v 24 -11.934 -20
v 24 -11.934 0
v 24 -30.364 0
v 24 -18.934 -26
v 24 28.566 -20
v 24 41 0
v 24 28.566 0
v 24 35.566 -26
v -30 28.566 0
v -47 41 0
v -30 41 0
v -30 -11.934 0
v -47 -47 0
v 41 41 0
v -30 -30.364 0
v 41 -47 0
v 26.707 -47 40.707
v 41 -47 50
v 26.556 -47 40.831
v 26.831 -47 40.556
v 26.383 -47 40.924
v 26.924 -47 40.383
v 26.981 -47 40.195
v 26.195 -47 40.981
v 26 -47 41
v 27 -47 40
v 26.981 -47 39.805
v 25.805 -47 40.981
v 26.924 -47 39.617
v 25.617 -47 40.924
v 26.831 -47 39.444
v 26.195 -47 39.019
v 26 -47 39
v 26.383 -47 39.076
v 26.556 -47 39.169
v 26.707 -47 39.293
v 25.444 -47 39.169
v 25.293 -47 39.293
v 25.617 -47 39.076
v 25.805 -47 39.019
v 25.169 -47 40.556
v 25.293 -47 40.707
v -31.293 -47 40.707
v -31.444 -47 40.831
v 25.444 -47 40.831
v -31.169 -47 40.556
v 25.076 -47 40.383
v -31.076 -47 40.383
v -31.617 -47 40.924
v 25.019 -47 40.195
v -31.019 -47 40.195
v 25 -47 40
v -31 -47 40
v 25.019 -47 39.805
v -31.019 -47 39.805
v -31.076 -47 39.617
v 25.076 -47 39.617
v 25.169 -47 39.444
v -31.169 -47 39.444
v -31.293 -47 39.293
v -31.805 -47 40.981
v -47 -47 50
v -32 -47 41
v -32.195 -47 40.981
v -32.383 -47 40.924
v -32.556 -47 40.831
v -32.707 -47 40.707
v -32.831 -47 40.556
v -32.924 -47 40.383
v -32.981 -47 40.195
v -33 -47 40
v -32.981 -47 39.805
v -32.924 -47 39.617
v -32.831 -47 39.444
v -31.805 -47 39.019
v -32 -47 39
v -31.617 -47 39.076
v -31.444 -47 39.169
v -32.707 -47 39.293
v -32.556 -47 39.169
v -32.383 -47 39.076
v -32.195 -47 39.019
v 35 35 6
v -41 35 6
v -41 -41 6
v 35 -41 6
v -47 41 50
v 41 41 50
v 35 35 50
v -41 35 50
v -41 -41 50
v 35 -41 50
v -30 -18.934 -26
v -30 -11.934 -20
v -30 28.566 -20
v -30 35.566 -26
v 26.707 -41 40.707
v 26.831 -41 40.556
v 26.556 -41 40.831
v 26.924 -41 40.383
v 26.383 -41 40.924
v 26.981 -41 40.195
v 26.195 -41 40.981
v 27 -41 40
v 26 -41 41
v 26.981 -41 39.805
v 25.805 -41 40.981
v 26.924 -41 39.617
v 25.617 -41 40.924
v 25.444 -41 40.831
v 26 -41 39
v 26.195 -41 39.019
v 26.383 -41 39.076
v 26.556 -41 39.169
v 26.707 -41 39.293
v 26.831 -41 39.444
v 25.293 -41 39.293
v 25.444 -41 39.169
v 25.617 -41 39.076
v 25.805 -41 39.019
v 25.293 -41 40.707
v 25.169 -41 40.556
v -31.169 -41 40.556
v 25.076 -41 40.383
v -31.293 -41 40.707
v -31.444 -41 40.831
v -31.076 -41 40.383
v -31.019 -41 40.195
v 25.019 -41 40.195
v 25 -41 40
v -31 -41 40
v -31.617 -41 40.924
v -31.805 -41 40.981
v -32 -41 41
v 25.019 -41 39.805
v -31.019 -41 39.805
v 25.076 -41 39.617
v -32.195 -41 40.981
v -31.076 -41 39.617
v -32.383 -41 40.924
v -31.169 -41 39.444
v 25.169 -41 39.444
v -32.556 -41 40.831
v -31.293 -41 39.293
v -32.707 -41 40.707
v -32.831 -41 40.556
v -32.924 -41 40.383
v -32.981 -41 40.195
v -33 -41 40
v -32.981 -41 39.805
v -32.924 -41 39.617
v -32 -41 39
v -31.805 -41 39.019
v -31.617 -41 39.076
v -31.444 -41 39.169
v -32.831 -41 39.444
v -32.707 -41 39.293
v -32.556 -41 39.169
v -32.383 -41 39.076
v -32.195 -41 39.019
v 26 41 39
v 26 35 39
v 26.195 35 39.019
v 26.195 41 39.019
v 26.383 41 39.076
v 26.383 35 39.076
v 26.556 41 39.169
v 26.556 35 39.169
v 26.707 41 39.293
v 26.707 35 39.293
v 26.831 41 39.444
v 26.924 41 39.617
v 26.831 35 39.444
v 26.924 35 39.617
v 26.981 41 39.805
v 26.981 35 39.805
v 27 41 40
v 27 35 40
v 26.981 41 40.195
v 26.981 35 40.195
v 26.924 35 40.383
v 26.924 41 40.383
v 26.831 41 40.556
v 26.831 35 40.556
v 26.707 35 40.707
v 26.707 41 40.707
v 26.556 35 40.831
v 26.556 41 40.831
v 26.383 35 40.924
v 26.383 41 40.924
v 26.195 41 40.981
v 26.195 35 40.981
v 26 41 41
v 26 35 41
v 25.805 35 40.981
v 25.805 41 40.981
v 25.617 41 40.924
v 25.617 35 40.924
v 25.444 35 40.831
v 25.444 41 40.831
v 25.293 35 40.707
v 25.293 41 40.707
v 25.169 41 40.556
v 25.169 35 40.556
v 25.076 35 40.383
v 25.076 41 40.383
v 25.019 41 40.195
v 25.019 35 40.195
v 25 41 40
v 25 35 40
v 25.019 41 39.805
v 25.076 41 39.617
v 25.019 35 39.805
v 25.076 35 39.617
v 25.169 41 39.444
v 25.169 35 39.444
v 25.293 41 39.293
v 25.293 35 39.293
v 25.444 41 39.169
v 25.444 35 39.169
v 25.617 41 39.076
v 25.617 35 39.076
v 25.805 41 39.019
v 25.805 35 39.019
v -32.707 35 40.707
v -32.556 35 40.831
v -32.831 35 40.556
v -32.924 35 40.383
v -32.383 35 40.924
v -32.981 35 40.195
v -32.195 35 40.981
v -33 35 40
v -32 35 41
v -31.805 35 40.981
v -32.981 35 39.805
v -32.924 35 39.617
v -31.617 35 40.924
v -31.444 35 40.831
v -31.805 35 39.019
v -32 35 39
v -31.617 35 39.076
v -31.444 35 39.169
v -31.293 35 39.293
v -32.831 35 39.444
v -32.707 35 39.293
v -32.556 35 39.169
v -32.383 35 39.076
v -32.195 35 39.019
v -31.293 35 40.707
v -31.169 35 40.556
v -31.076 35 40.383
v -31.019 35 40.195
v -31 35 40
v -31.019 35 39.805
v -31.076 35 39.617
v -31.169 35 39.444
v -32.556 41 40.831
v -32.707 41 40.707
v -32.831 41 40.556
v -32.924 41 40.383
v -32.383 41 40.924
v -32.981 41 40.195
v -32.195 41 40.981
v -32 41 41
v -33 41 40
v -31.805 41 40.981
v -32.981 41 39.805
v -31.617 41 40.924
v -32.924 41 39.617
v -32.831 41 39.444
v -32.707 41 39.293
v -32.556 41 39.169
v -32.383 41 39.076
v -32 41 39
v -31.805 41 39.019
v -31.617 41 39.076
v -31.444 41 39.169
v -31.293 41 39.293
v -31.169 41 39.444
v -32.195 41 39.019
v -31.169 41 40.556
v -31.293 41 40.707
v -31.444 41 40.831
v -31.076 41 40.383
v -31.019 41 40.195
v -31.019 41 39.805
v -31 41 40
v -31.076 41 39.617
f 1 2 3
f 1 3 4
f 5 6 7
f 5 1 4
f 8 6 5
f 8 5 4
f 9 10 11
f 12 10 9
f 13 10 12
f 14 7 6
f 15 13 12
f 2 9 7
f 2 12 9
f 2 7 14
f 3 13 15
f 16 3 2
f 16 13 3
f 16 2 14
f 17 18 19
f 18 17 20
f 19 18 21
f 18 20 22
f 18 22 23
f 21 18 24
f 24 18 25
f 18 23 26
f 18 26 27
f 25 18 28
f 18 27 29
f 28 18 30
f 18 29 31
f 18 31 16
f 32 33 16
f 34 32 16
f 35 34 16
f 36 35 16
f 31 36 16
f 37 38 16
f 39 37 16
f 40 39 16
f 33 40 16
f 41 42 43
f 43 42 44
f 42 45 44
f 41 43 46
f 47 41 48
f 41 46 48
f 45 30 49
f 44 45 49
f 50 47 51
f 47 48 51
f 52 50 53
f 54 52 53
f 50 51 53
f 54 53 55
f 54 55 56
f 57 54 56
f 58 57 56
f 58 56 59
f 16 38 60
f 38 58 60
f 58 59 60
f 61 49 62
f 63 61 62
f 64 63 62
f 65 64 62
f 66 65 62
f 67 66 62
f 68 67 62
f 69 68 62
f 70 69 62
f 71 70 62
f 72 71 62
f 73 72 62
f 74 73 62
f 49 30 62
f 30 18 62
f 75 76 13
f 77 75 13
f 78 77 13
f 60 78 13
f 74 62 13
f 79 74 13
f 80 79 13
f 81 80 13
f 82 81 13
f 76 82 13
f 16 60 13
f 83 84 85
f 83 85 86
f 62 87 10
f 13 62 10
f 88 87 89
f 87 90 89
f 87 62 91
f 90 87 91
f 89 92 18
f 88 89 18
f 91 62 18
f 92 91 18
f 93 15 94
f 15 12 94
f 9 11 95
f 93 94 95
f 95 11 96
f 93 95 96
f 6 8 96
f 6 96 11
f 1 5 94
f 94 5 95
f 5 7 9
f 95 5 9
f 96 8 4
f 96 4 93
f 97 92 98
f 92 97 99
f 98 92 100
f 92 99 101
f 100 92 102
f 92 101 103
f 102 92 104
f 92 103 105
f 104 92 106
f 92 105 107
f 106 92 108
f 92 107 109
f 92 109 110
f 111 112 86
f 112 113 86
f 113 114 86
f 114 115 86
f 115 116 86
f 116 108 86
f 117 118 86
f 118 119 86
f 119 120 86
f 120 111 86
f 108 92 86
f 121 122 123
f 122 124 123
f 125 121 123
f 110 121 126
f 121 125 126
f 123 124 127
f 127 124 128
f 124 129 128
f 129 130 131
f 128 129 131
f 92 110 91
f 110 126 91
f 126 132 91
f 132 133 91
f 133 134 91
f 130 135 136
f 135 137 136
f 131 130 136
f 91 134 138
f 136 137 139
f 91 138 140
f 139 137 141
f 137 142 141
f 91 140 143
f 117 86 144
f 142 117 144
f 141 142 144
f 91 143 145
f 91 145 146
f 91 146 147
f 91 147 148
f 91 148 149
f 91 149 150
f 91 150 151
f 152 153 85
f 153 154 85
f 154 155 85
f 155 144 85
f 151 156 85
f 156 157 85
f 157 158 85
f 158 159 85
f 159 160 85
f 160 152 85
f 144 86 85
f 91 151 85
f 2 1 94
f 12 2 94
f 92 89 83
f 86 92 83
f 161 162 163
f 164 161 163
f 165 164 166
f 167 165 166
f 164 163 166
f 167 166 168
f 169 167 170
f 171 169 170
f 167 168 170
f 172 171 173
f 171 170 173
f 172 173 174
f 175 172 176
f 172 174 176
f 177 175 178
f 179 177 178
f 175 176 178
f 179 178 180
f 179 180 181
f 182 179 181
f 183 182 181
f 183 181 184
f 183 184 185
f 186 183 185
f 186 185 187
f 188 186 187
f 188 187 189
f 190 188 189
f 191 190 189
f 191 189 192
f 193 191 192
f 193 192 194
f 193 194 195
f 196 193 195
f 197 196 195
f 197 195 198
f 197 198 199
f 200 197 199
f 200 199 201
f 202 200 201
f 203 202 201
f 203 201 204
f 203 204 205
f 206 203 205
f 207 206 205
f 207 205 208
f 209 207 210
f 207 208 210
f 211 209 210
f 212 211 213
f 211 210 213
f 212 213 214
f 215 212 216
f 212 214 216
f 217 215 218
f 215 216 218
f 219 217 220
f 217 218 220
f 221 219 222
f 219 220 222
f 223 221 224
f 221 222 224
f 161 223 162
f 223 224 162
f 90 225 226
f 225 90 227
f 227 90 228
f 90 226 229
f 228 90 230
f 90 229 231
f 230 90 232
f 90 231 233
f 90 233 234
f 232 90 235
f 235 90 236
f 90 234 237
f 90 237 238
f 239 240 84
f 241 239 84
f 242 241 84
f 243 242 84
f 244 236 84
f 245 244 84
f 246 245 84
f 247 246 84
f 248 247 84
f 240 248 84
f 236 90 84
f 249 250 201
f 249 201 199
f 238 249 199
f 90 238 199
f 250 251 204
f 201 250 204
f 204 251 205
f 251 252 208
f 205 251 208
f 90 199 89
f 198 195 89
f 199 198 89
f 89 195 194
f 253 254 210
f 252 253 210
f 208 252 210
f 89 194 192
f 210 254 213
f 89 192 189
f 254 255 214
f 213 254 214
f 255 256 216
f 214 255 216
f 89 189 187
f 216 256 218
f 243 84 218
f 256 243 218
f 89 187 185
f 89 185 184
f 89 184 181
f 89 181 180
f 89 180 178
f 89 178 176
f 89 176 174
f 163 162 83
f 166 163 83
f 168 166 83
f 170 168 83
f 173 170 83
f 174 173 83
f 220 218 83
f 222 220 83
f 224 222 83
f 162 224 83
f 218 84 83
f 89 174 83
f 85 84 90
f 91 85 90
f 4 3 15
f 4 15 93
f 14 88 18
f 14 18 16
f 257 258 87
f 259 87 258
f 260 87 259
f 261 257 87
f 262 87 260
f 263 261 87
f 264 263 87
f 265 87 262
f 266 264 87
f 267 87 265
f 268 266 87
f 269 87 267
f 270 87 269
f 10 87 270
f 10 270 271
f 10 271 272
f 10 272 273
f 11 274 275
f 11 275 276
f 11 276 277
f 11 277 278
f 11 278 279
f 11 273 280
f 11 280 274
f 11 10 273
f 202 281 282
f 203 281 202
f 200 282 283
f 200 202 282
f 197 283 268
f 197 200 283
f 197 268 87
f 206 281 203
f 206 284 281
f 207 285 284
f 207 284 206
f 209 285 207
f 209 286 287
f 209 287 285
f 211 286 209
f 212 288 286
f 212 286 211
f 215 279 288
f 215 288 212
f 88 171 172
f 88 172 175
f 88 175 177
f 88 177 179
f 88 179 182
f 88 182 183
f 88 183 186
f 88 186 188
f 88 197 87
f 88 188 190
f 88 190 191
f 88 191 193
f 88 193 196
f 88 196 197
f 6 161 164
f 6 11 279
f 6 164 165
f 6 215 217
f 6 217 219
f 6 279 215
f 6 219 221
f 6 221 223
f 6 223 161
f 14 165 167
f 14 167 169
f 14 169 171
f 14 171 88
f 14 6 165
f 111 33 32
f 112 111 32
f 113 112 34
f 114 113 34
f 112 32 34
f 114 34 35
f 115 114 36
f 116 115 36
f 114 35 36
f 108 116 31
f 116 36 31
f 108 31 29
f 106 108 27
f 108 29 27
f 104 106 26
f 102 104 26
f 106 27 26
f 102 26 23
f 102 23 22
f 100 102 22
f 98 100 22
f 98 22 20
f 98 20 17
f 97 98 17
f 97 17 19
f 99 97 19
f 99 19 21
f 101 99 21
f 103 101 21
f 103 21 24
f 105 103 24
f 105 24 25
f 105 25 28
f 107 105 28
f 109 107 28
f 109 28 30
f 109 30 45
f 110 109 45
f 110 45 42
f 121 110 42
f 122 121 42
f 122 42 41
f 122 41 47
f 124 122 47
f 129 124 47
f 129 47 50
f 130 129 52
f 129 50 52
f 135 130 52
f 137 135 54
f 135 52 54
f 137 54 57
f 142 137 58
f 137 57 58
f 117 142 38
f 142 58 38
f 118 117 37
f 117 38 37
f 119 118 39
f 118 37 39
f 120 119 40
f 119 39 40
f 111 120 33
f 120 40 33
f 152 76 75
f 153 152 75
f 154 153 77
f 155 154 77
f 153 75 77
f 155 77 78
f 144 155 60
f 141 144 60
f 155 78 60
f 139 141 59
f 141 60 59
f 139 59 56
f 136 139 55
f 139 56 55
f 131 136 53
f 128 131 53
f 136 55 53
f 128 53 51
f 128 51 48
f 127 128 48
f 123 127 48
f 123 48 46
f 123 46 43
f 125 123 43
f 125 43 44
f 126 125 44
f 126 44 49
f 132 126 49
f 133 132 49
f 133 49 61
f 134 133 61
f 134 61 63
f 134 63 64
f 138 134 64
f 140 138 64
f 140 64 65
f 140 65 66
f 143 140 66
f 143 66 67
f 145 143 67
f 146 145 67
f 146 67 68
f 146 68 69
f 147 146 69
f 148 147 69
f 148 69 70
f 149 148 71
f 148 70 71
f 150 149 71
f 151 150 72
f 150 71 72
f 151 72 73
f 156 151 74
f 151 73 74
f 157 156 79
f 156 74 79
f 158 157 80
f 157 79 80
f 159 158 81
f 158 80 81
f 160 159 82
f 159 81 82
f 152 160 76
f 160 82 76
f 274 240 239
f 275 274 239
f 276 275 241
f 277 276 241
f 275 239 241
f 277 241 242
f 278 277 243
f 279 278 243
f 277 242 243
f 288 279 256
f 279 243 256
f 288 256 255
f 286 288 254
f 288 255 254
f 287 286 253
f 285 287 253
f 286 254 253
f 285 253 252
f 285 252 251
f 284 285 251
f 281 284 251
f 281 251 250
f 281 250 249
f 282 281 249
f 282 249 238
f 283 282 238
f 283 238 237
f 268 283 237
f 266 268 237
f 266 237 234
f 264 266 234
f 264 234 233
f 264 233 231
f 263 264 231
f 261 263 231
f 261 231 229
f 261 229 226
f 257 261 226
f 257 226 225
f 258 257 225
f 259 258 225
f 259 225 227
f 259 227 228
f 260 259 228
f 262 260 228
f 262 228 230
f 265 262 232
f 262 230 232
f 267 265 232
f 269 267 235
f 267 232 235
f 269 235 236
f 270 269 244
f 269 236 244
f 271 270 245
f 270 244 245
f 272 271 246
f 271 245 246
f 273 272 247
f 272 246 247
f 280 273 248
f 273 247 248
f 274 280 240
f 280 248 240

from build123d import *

# Parameters (mm, degrees)
ESQUISSE1_W             = 76
ESQUISSE1_H             = 76
BOSS_EXTRU_1_DEPTH      = 6
ESQUISSE3_W             = 76
ESQUISSE3_H             = 50
BOSS_EXTRU_2_DEPTH      = 6
ESQUISSE4_W             = 50
ESQUISSE4_H             = 82
BOSS_EXTRU_3_DEPTH      = 6
ESQUISSE5_W             = 50
ESQUISSE5_H             = 82
BOSS_EXTRU_4_DEPTH      = 6
ESQUISSE6_W             = 88
ESQUISSE6_H             = 50
BOSS_EXTRU_5_DEPTH      = 6
ESQUISSE8_W             = 54
ESQUISSE8_H             = 7
BOSS_EXTRU_6_DEPTH      = 26
ESQUISSE9_W             = 54
ESQUISSE9_H             = 6
BOSS_EXTRU_7_DEPTH      = 40.5
ESQUISSE11_W            = 54
ESQUISSE11_H            = 7
BOSS_EXTRU_8_DEPTH      = 26
BOSS_EXTRU_10_DEPTH     = 54
ESQUISSE13_R            = 1
ENL_V_MAT_EXTRU_1_DEPTH = 100


with BuildPart() as part:
    # Esquisse1 → Boss.-Extru.1 (new body)
    with BuildSketch(Plane.XY):
        with Locations((-3, -3)):
            Rectangle(ESQUISSE1_W, ESQUISSE1_H)
    extrude(amount=BOSS_EXTRU_1_DEPTH)

    # Esquisse3 → Boss.-Extru.2 (add)
    with BuildSketch(Plane(origin=(0, -41, 0), x_dir=(-1, 0, 0), z_dir=(0, -1, 0))):
        with Locations((3, -25)):
            Rectangle(ESQUISSE3_W, ESQUISSE3_H)
    extrude(amount=BOSS_EXTRU_2_DEPTH)

    # Esquisse4 → Boss.-Extru.3 (add)
    with BuildSketch(Plane.ZY.offset(41)):
        with Locations((25, -6)):
            Rectangle(ESQUISSE4_W, ESQUISSE4_H)
    extrude(amount=BOSS_EXTRU_3_DEPTH)

    # Esquisse5 → Boss.-Extru.4 (add)
    with BuildSketch(Plane(origin=(35, 0, 0), x_dir=(0, 0, -1), z_dir=(1, 0, 0))):
        with Locations((-25, -6)):
            Rectangle(ESQUISSE5_W, ESQUISSE5_H)
    extrude(amount=BOSS_EXTRU_4_DEPTH)

    # Esquisse6 → Boss.-Extru.5 (add)
    with BuildSketch(Plane(origin=(0, 35, 0), x_dir=(1, 0, 0), z_dir=(0, 1, 0))):
        with Locations((-3, -25)):
            Rectangle(ESQUISSE6_W, ESQUISSE6_H)
    extrude(amount=BOSS_EXTRU_5_DEPTH)

    # Esquisse8 → Boss.-Extru.6 (add)
    with BuildSketch(Plane(origin=(0, 0, 0), x_dir=(-1, 0, 0), z_dir=(0, 0, -1))):
        with Locations((3, 32.065521745)):
            Rectangle(ESQUISSE8_W, ESQUISSE8_H)
    extrude(amount=BOSS_EXTRU_6_DEPTH)

    # Esquisse9 → Boss.-Extru.7 (add)
    with BuildSketch(Plane(origin=(0, 28.565521745, 0), x_dir=(-1, 0, 0), z_dir=(0, -1, 0))):
        with Locations((3, 23)):
            Rectangle(ESQUISSE9_W, ESQUISSE9_H)
    extrude(amount=BOSS_EXTRU_7_DEPTH)

    # Esquisse11 → Boss.-Extru.8 (add)
    with BuildSketch(Plane(origin=(0, 0, -26), x_dir=(-1, 0, 0), z_dir=(0, 0, -1))):
        with Locations((3, -15.434478255)):
            Rectangle(ESQUISSE11_W, ESQUISSE11_H)
    extrude(amount=-BOSS_EXTRU_8_DEPTH)

    # Esquisse12 → Boss.-Extru.10 (add)
    with BuildSketch(Plane(origin=(24, 0, 0), x_dir=(0, 0, -1), z_dir=(1, 0, 0))):
        Polygon((26, -18.934478255), (0, -18.934478255), (0, -30.364478255), align=None)
        Polygon((0, 35.565521745), (26, 35.565521745), (0, 41), align=None)
    extrude(amount=-BOSS_EXTRU_10_DEPTH)

    # Esquisse13 → Enlèv. mat.-Extru.1 (cut)
    with BuildSketch(Plane(origin=(0, -47, 0), x_dir=(-1, 0, 0), z_dir=(0, -1, 0))):
        with Locations(Location((-26, -40, 0), (0, 0, 90))):
            Circle(ESQUISSE13_R)
        with Locations(Location((32, -40, 0), (0, 0, 90))):
            Circle(ESQUISSE13_R)
    extrude(amount=-ENL_V_MAT_EXTRU_1_DEPTH, mode=Mode.SUBTRACT)


solid = part.part
